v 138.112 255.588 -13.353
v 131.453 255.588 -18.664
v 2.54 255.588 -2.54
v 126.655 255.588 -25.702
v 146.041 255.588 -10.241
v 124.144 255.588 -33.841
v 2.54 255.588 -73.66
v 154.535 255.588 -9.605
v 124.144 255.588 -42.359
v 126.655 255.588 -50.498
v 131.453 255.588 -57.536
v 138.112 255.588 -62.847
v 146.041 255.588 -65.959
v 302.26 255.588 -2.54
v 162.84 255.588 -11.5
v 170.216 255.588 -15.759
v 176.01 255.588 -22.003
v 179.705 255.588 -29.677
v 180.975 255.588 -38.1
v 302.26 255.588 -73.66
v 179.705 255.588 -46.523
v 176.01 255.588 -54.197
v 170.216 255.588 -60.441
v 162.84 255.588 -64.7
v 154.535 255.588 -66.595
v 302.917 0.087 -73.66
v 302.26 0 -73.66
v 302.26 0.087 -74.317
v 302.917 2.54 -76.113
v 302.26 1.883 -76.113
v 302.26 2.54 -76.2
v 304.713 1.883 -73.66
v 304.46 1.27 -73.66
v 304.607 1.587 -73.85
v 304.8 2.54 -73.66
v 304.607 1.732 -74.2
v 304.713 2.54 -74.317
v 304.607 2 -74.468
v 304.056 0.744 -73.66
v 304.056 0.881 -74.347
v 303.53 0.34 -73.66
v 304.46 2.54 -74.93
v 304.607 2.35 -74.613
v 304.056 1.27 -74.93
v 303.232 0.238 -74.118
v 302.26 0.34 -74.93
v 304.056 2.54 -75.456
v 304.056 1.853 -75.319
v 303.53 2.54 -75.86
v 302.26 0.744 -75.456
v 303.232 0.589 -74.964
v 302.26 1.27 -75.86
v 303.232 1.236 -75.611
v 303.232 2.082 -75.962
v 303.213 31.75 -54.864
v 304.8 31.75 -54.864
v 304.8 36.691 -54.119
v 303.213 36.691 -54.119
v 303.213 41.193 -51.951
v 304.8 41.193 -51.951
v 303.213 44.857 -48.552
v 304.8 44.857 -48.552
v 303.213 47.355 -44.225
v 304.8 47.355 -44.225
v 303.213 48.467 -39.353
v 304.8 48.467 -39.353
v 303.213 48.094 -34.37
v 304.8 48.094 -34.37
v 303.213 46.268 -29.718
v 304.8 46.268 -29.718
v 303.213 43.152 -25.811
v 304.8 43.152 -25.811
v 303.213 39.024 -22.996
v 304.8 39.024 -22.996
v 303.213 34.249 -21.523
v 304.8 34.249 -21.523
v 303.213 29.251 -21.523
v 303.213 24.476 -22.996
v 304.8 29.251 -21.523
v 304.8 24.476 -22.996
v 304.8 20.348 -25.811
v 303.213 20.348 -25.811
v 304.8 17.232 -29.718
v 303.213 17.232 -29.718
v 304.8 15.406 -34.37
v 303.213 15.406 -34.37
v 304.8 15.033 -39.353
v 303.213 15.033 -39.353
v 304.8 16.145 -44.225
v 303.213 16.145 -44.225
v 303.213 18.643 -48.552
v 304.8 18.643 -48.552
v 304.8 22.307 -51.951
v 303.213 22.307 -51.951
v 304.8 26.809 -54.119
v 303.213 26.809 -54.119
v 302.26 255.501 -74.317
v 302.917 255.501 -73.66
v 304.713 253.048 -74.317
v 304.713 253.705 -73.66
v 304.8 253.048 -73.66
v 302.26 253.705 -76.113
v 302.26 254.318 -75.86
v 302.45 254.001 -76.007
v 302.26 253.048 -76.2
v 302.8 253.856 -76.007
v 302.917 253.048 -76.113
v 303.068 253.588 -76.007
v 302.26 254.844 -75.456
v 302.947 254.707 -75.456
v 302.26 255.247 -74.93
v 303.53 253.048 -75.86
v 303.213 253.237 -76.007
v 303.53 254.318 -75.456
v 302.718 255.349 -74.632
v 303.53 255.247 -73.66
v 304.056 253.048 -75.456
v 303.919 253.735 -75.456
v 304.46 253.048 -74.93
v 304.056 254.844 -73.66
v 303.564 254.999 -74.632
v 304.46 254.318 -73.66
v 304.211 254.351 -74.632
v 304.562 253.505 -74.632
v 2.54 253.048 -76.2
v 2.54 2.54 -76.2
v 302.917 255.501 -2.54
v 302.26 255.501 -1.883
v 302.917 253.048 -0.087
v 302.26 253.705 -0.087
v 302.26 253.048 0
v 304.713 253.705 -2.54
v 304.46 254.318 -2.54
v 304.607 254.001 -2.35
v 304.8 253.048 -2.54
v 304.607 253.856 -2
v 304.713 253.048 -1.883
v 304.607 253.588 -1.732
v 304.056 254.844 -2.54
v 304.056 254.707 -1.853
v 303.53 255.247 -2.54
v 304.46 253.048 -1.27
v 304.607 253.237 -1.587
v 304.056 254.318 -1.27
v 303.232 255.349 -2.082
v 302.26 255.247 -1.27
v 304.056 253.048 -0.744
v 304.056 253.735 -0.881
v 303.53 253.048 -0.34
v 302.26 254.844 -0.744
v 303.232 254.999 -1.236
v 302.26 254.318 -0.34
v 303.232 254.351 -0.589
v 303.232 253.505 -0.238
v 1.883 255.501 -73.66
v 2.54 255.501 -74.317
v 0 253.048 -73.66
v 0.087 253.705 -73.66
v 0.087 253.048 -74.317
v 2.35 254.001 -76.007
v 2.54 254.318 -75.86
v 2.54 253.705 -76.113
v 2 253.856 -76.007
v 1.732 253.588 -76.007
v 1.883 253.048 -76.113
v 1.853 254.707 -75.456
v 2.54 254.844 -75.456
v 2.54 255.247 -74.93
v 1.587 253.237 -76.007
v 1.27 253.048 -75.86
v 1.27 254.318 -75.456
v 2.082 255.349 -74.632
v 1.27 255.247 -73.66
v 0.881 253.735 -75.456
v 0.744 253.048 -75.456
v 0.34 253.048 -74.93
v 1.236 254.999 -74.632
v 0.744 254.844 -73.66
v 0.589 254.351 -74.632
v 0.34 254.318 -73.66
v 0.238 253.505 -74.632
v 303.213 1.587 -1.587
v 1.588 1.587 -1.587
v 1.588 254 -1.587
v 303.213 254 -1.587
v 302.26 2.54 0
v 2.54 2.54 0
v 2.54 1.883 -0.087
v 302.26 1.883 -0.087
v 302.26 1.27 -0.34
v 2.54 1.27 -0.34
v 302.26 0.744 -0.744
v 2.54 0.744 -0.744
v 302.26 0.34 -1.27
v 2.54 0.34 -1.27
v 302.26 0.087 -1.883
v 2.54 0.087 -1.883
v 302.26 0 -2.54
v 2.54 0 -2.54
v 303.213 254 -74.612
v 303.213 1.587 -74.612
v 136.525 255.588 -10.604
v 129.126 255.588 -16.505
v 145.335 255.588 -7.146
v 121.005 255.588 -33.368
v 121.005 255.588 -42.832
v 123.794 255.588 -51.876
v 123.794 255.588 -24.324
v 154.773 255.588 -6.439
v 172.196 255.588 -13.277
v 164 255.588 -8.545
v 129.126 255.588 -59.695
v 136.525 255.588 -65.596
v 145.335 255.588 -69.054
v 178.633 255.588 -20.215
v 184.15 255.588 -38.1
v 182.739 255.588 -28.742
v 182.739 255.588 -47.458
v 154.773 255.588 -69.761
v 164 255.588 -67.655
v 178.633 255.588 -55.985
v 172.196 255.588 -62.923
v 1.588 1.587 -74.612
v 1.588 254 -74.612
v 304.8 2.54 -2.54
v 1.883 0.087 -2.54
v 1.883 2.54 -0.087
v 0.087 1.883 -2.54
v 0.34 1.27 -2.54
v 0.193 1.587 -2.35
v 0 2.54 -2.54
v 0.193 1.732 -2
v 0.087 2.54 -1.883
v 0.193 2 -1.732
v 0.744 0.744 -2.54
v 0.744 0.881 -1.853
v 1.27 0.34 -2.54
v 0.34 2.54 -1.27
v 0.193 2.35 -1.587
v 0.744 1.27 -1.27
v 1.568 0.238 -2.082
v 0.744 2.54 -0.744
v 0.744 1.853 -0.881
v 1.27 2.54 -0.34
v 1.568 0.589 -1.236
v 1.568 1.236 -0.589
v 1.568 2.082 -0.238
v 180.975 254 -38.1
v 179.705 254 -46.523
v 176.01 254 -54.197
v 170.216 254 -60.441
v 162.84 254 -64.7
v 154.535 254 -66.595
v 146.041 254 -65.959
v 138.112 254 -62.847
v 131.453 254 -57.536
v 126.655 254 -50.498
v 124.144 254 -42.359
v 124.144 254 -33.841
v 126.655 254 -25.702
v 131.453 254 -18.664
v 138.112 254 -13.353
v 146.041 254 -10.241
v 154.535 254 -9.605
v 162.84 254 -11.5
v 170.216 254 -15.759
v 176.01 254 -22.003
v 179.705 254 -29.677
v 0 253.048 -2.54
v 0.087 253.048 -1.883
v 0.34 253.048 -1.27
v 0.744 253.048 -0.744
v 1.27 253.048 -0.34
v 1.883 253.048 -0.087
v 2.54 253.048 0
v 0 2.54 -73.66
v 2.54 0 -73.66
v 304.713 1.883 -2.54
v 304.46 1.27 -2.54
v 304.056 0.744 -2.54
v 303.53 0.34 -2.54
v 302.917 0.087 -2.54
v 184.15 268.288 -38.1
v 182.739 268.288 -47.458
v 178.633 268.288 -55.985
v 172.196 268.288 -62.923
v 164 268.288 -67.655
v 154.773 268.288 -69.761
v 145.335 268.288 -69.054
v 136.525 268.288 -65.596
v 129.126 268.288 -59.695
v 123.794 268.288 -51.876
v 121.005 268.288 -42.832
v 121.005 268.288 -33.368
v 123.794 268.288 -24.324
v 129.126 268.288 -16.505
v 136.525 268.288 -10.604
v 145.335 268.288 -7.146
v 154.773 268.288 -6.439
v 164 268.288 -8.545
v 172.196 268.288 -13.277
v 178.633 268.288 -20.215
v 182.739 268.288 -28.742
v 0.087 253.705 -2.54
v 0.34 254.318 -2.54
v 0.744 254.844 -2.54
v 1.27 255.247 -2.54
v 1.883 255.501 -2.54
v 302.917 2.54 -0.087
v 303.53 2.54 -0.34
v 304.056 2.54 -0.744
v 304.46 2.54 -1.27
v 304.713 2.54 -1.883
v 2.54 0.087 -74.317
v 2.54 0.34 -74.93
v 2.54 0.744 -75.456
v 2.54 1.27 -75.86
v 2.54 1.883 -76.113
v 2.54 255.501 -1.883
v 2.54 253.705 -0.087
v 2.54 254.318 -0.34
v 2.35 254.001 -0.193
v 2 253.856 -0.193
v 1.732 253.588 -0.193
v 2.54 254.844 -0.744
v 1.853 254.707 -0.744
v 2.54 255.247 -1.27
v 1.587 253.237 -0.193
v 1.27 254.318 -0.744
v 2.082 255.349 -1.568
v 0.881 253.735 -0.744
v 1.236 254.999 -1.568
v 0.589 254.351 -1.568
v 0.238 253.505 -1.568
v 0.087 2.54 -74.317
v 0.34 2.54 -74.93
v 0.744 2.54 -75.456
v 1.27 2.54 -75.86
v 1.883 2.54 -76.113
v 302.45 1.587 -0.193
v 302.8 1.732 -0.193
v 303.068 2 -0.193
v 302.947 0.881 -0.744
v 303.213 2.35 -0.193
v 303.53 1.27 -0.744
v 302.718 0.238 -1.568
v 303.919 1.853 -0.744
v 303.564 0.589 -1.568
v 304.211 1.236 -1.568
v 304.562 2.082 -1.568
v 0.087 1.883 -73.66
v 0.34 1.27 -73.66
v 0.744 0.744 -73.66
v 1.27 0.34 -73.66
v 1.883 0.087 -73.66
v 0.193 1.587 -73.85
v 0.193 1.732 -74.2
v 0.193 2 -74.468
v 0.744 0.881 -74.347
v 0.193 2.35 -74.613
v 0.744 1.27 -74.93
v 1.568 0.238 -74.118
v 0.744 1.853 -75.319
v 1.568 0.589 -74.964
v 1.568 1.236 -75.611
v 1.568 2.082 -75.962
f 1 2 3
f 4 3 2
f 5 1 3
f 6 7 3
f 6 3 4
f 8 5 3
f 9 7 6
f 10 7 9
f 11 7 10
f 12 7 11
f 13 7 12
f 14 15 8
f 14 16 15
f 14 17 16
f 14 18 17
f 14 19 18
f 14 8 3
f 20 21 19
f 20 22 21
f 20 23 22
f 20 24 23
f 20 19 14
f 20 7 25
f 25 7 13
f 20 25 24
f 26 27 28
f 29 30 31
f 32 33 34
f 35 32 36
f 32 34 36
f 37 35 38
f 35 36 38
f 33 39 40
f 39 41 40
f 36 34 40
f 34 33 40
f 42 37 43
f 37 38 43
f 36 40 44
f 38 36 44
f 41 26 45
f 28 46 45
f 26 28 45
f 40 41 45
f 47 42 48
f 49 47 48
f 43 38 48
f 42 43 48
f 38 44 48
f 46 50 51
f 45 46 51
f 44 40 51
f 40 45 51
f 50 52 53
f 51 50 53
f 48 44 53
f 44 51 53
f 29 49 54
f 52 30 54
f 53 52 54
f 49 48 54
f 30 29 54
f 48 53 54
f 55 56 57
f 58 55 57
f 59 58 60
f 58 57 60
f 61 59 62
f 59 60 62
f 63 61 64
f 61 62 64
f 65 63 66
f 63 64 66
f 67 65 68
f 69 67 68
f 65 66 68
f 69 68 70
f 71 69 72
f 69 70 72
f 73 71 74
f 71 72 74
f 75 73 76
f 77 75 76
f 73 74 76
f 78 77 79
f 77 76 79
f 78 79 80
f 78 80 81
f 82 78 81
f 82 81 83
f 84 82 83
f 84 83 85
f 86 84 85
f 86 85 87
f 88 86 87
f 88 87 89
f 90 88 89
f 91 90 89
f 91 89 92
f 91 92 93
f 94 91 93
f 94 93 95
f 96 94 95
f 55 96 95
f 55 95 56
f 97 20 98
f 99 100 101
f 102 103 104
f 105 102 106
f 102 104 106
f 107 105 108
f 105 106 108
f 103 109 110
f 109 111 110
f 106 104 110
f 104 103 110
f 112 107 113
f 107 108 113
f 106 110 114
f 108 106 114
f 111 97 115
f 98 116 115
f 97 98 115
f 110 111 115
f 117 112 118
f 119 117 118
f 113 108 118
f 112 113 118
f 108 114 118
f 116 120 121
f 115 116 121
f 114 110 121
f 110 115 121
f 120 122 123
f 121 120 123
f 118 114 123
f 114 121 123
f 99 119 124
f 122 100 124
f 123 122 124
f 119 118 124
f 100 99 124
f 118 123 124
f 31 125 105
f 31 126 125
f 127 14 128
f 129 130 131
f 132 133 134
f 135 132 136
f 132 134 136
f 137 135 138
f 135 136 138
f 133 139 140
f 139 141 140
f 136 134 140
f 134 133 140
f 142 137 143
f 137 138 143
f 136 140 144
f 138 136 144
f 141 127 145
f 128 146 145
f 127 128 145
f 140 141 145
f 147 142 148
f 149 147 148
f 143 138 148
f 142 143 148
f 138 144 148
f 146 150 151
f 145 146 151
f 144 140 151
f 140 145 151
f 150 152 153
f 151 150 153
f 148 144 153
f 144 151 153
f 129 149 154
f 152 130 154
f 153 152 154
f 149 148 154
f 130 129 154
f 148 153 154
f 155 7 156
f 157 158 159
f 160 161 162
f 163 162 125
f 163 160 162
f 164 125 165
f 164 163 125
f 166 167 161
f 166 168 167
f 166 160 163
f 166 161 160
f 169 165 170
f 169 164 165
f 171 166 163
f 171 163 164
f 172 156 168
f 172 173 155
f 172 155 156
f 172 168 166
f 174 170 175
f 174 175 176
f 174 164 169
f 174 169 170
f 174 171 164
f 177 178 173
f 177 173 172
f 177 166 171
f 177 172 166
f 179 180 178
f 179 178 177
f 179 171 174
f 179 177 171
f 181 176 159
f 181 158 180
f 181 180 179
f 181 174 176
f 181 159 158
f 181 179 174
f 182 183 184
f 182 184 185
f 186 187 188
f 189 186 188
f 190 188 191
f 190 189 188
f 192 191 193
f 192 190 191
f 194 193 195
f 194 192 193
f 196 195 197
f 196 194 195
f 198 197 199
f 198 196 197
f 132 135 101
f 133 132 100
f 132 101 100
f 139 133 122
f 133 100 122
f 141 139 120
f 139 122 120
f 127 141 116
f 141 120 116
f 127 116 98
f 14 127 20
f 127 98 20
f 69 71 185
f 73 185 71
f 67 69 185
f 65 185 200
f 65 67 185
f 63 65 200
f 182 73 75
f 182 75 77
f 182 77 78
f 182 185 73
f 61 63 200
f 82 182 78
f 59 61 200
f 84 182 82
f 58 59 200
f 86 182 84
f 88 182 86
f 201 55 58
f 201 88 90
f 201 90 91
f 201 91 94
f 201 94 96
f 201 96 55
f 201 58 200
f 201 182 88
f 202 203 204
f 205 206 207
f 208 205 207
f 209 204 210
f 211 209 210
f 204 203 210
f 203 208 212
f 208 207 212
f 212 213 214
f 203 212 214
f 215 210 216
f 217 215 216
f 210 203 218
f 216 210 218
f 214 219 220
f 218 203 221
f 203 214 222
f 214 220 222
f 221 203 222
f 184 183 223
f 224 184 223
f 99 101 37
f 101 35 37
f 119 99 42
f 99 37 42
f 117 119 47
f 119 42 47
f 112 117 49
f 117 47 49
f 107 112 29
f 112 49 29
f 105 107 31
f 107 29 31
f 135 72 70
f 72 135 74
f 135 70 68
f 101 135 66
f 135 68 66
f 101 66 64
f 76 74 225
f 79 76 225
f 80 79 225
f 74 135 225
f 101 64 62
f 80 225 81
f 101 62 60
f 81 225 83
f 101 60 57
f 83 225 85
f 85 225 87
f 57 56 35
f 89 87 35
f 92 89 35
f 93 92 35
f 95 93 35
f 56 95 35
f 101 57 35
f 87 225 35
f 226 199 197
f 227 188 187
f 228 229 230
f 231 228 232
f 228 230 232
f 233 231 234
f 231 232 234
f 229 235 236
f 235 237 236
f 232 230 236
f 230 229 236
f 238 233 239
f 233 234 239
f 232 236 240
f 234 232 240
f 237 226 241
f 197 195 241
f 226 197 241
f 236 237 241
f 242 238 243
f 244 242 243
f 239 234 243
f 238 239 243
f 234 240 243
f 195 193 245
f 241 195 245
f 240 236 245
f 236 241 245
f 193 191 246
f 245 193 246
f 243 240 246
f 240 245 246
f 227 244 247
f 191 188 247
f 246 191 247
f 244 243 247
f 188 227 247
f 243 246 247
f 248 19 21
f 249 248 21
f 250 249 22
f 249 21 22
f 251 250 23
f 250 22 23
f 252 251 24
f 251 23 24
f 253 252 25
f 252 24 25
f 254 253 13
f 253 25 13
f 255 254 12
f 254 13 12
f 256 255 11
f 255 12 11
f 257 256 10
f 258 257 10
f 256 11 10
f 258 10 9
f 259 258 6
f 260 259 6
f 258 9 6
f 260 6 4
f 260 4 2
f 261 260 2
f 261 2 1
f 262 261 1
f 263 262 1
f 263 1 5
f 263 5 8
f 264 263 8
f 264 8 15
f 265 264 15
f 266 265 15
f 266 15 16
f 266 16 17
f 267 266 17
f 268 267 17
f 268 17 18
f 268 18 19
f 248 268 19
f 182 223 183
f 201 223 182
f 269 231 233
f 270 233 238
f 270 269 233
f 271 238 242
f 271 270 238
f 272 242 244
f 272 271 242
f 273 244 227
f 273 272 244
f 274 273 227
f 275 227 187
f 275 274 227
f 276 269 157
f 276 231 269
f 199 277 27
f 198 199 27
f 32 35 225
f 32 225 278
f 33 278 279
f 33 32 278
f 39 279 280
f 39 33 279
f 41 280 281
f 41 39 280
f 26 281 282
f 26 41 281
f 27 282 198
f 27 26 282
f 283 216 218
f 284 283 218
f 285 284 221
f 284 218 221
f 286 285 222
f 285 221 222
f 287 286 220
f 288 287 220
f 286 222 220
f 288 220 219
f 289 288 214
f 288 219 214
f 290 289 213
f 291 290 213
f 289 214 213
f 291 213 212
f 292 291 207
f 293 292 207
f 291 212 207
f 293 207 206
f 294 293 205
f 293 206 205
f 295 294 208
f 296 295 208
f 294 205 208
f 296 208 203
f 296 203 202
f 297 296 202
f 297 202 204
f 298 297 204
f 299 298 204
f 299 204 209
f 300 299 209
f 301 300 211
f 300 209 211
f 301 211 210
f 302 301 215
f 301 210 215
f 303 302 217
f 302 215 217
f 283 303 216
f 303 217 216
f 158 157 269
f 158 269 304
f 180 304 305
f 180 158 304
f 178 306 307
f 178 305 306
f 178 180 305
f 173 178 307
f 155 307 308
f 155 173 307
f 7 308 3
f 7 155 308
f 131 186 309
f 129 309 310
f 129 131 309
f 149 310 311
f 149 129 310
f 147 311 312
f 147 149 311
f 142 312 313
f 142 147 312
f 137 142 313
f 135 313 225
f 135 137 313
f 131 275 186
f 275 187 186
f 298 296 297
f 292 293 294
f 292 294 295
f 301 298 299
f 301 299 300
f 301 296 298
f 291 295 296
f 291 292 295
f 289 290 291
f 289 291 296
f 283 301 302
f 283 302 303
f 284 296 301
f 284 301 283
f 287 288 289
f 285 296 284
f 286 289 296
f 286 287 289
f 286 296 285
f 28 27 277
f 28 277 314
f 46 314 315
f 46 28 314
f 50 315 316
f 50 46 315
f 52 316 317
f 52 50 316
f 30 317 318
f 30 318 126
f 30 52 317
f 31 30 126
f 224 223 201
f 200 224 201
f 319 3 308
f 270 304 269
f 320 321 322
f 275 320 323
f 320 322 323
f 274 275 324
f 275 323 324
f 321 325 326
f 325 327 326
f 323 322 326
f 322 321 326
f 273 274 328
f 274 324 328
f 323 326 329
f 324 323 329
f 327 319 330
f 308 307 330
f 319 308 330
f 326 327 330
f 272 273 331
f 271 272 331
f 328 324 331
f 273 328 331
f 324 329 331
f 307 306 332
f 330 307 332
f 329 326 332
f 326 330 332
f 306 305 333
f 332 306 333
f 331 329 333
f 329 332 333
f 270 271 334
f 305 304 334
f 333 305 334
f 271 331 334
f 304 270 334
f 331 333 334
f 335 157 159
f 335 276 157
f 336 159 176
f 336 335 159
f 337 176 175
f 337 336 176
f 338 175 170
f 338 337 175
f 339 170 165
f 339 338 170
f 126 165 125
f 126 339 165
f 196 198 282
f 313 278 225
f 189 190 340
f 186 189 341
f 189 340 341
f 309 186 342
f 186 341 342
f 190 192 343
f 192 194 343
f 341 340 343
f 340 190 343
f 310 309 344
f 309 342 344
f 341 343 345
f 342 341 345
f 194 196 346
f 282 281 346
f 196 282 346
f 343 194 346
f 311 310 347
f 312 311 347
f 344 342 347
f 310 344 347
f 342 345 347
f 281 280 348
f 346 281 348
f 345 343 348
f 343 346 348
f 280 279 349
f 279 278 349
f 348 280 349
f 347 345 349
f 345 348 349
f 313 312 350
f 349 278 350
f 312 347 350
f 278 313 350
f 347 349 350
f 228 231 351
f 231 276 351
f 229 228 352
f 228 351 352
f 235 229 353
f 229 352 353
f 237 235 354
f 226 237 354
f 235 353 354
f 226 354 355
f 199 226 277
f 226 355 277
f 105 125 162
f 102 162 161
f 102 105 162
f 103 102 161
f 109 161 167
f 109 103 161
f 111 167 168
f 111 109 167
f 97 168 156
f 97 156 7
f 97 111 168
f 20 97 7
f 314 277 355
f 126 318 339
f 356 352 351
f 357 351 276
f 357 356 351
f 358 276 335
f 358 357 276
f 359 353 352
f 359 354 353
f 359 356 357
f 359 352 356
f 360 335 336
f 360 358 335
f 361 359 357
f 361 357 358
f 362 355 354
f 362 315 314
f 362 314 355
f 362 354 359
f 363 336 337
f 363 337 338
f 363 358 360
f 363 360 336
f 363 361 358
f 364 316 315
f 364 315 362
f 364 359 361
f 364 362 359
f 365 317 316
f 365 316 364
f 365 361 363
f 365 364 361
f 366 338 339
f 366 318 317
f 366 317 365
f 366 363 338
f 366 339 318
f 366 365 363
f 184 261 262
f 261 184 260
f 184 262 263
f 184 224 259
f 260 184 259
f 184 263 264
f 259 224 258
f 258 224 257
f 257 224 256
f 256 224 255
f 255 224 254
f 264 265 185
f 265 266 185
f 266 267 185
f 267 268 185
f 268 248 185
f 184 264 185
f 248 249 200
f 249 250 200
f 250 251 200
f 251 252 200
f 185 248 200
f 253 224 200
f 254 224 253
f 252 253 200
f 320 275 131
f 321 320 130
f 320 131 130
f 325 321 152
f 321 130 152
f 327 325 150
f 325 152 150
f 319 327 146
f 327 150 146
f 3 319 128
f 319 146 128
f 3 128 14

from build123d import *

# Parameters (mm, degrees)
SKETCH1_W           = 304.8
SKETCH1_H           = 76.2
BOSS_EXTRUDE1_DEPTH = 254
SHELL1_T            = -1.5875
SKETCH2_W           = 304.8
SKETCH2_H           = 76.2
BOSS_EXTRUDE2_DEPTH = 1.5875
FILLET1_R           = 2.54
CUT_EXTRUDE1_REACH  = 306.8
SKETCH3_R           = 16.764
CUT_EXTRUDE2_REACH  = 257.588
SKETCH4_R           = 28.575
SKETCH5_R           = 31.75
BOSS_EXTRUDE3_DEPTH = 12.7


with BuildPart() as part:
    # Sketch1 → Boss-Extrude1 (new body)
    with BuildSketch(Plane(origin=(0, 0, 0), x_dir=(1, 0, 0), z_dir=(0, 1, 0))):
        with Locations((152.4, 38.1)):
            Rectangle(SKETCH1_W, SKETCH1_H)
    extrude(amount=BOSS_EXTRUDE1_DEPTH)

    # Shell1
    shell1_openings = [part.faces().sort_by_distance(p)[0] for p in [
        (152.4, 254, -38.1),
    ]]
    offset(amount=SHELL1_T, openings=shell1_openings, kind=Kind.INTERSECTION)

    # Sketch2 → Boss-Extrude2 (add)
    with BuildSketch(Plane(origin=(0, 254, 0), x_dir=(1, 0, 0), z_dir=(0, 1, 0))):
        with Locations((152.4, 38.1)):
            Rectangle(SKETCH2_W, SKETCH2_H)
    extrude(amount=BOSS_EXTRUDE2_DEPTH)

    # Fillet1
    fillet1_edges = [part.edges().sort_by_distance(p)[0] for p in [
        (0, 255.5875, -38.1),
        (152.4, 255.5875, 0),
        (304.8, 255.5875, -38.1),
        (152.4, 255.5875, -76.2),
        (152.4, 0, -76.2),
        (304.8, 0, -38.1),
        (152.4, 0, 0),
        (0, 0, -38.1),
        (0, 127.79375, -76.2),
        (304.8, 127.79375, -76.2),
        (304.8, 127.79375, 0),
        (0, 127.79375, 0),
    ]]
    fillet(fillet1_edges, radius=FILLET1_R)

    # Sketch3 → Cut-Extrude1 (cut, up to next)
    with BuildSketch(Plane(origin=(304.8, 0, 0), x_dir=(0, 0, -1), z_dir=(1, 0, 0)), mode=Mode.PRIVATE) as cut_extrude1_sk1:
        with Locations((38.1, 31.75)):
            Circle(SKETCH3_R)
    cut_extrude1_tool1 = extrude(cut_extrude1_sk1.sketch, amount=-CUT_EXTRUDE1_REACH, mode=Mode.PRIVATE) & part.part
    add(cut_extrude1_tool1.solids().sort_by_distance((304.8, 31.75, -38.1))[0], mode=Mode.SUBTRACT)

    # Sketch4 → Cut-Extrude2 (cut, up to next)
    with BuildSketch(Plane(origin=(0, 255.5875, 0), x_dir=(1, 0, 0), z_dir=(0, 1, 0)), mode=Mode.PRIVATE) as cut_extrude2_sk1:
        with Locations((152.4, 38.1)):
            Circle(SKETCH4_R)
    cut_extrude2_tool1 = extrude(cut_extrude2_sk1.sketch, amount=-CUT_EXTRUDE2_REACH, mode=Mode.PRIVATE) & part.part
    add(cut_extrude2_tool1.solids().sort_by_distance((152.4, 255.5875, -38.1))[0], mode=Mode.SUBTRACT)


with BuildPart() as body_2:
    # Sketch5 → Boss-Extrude3 (new body)
    with BuildSketch(Plane(origin=(0, 255.5875, 0), x_dir=(1, 0, 0), z_dir=(0, 1, 0))):
        with Locations((152.4, 38.1)):
            Circle(SKETCH5_R)
    extrude(amount=BOSS_EXTRUDE3_DEPTH)


solid = Compound([part.part, body_2.part])
